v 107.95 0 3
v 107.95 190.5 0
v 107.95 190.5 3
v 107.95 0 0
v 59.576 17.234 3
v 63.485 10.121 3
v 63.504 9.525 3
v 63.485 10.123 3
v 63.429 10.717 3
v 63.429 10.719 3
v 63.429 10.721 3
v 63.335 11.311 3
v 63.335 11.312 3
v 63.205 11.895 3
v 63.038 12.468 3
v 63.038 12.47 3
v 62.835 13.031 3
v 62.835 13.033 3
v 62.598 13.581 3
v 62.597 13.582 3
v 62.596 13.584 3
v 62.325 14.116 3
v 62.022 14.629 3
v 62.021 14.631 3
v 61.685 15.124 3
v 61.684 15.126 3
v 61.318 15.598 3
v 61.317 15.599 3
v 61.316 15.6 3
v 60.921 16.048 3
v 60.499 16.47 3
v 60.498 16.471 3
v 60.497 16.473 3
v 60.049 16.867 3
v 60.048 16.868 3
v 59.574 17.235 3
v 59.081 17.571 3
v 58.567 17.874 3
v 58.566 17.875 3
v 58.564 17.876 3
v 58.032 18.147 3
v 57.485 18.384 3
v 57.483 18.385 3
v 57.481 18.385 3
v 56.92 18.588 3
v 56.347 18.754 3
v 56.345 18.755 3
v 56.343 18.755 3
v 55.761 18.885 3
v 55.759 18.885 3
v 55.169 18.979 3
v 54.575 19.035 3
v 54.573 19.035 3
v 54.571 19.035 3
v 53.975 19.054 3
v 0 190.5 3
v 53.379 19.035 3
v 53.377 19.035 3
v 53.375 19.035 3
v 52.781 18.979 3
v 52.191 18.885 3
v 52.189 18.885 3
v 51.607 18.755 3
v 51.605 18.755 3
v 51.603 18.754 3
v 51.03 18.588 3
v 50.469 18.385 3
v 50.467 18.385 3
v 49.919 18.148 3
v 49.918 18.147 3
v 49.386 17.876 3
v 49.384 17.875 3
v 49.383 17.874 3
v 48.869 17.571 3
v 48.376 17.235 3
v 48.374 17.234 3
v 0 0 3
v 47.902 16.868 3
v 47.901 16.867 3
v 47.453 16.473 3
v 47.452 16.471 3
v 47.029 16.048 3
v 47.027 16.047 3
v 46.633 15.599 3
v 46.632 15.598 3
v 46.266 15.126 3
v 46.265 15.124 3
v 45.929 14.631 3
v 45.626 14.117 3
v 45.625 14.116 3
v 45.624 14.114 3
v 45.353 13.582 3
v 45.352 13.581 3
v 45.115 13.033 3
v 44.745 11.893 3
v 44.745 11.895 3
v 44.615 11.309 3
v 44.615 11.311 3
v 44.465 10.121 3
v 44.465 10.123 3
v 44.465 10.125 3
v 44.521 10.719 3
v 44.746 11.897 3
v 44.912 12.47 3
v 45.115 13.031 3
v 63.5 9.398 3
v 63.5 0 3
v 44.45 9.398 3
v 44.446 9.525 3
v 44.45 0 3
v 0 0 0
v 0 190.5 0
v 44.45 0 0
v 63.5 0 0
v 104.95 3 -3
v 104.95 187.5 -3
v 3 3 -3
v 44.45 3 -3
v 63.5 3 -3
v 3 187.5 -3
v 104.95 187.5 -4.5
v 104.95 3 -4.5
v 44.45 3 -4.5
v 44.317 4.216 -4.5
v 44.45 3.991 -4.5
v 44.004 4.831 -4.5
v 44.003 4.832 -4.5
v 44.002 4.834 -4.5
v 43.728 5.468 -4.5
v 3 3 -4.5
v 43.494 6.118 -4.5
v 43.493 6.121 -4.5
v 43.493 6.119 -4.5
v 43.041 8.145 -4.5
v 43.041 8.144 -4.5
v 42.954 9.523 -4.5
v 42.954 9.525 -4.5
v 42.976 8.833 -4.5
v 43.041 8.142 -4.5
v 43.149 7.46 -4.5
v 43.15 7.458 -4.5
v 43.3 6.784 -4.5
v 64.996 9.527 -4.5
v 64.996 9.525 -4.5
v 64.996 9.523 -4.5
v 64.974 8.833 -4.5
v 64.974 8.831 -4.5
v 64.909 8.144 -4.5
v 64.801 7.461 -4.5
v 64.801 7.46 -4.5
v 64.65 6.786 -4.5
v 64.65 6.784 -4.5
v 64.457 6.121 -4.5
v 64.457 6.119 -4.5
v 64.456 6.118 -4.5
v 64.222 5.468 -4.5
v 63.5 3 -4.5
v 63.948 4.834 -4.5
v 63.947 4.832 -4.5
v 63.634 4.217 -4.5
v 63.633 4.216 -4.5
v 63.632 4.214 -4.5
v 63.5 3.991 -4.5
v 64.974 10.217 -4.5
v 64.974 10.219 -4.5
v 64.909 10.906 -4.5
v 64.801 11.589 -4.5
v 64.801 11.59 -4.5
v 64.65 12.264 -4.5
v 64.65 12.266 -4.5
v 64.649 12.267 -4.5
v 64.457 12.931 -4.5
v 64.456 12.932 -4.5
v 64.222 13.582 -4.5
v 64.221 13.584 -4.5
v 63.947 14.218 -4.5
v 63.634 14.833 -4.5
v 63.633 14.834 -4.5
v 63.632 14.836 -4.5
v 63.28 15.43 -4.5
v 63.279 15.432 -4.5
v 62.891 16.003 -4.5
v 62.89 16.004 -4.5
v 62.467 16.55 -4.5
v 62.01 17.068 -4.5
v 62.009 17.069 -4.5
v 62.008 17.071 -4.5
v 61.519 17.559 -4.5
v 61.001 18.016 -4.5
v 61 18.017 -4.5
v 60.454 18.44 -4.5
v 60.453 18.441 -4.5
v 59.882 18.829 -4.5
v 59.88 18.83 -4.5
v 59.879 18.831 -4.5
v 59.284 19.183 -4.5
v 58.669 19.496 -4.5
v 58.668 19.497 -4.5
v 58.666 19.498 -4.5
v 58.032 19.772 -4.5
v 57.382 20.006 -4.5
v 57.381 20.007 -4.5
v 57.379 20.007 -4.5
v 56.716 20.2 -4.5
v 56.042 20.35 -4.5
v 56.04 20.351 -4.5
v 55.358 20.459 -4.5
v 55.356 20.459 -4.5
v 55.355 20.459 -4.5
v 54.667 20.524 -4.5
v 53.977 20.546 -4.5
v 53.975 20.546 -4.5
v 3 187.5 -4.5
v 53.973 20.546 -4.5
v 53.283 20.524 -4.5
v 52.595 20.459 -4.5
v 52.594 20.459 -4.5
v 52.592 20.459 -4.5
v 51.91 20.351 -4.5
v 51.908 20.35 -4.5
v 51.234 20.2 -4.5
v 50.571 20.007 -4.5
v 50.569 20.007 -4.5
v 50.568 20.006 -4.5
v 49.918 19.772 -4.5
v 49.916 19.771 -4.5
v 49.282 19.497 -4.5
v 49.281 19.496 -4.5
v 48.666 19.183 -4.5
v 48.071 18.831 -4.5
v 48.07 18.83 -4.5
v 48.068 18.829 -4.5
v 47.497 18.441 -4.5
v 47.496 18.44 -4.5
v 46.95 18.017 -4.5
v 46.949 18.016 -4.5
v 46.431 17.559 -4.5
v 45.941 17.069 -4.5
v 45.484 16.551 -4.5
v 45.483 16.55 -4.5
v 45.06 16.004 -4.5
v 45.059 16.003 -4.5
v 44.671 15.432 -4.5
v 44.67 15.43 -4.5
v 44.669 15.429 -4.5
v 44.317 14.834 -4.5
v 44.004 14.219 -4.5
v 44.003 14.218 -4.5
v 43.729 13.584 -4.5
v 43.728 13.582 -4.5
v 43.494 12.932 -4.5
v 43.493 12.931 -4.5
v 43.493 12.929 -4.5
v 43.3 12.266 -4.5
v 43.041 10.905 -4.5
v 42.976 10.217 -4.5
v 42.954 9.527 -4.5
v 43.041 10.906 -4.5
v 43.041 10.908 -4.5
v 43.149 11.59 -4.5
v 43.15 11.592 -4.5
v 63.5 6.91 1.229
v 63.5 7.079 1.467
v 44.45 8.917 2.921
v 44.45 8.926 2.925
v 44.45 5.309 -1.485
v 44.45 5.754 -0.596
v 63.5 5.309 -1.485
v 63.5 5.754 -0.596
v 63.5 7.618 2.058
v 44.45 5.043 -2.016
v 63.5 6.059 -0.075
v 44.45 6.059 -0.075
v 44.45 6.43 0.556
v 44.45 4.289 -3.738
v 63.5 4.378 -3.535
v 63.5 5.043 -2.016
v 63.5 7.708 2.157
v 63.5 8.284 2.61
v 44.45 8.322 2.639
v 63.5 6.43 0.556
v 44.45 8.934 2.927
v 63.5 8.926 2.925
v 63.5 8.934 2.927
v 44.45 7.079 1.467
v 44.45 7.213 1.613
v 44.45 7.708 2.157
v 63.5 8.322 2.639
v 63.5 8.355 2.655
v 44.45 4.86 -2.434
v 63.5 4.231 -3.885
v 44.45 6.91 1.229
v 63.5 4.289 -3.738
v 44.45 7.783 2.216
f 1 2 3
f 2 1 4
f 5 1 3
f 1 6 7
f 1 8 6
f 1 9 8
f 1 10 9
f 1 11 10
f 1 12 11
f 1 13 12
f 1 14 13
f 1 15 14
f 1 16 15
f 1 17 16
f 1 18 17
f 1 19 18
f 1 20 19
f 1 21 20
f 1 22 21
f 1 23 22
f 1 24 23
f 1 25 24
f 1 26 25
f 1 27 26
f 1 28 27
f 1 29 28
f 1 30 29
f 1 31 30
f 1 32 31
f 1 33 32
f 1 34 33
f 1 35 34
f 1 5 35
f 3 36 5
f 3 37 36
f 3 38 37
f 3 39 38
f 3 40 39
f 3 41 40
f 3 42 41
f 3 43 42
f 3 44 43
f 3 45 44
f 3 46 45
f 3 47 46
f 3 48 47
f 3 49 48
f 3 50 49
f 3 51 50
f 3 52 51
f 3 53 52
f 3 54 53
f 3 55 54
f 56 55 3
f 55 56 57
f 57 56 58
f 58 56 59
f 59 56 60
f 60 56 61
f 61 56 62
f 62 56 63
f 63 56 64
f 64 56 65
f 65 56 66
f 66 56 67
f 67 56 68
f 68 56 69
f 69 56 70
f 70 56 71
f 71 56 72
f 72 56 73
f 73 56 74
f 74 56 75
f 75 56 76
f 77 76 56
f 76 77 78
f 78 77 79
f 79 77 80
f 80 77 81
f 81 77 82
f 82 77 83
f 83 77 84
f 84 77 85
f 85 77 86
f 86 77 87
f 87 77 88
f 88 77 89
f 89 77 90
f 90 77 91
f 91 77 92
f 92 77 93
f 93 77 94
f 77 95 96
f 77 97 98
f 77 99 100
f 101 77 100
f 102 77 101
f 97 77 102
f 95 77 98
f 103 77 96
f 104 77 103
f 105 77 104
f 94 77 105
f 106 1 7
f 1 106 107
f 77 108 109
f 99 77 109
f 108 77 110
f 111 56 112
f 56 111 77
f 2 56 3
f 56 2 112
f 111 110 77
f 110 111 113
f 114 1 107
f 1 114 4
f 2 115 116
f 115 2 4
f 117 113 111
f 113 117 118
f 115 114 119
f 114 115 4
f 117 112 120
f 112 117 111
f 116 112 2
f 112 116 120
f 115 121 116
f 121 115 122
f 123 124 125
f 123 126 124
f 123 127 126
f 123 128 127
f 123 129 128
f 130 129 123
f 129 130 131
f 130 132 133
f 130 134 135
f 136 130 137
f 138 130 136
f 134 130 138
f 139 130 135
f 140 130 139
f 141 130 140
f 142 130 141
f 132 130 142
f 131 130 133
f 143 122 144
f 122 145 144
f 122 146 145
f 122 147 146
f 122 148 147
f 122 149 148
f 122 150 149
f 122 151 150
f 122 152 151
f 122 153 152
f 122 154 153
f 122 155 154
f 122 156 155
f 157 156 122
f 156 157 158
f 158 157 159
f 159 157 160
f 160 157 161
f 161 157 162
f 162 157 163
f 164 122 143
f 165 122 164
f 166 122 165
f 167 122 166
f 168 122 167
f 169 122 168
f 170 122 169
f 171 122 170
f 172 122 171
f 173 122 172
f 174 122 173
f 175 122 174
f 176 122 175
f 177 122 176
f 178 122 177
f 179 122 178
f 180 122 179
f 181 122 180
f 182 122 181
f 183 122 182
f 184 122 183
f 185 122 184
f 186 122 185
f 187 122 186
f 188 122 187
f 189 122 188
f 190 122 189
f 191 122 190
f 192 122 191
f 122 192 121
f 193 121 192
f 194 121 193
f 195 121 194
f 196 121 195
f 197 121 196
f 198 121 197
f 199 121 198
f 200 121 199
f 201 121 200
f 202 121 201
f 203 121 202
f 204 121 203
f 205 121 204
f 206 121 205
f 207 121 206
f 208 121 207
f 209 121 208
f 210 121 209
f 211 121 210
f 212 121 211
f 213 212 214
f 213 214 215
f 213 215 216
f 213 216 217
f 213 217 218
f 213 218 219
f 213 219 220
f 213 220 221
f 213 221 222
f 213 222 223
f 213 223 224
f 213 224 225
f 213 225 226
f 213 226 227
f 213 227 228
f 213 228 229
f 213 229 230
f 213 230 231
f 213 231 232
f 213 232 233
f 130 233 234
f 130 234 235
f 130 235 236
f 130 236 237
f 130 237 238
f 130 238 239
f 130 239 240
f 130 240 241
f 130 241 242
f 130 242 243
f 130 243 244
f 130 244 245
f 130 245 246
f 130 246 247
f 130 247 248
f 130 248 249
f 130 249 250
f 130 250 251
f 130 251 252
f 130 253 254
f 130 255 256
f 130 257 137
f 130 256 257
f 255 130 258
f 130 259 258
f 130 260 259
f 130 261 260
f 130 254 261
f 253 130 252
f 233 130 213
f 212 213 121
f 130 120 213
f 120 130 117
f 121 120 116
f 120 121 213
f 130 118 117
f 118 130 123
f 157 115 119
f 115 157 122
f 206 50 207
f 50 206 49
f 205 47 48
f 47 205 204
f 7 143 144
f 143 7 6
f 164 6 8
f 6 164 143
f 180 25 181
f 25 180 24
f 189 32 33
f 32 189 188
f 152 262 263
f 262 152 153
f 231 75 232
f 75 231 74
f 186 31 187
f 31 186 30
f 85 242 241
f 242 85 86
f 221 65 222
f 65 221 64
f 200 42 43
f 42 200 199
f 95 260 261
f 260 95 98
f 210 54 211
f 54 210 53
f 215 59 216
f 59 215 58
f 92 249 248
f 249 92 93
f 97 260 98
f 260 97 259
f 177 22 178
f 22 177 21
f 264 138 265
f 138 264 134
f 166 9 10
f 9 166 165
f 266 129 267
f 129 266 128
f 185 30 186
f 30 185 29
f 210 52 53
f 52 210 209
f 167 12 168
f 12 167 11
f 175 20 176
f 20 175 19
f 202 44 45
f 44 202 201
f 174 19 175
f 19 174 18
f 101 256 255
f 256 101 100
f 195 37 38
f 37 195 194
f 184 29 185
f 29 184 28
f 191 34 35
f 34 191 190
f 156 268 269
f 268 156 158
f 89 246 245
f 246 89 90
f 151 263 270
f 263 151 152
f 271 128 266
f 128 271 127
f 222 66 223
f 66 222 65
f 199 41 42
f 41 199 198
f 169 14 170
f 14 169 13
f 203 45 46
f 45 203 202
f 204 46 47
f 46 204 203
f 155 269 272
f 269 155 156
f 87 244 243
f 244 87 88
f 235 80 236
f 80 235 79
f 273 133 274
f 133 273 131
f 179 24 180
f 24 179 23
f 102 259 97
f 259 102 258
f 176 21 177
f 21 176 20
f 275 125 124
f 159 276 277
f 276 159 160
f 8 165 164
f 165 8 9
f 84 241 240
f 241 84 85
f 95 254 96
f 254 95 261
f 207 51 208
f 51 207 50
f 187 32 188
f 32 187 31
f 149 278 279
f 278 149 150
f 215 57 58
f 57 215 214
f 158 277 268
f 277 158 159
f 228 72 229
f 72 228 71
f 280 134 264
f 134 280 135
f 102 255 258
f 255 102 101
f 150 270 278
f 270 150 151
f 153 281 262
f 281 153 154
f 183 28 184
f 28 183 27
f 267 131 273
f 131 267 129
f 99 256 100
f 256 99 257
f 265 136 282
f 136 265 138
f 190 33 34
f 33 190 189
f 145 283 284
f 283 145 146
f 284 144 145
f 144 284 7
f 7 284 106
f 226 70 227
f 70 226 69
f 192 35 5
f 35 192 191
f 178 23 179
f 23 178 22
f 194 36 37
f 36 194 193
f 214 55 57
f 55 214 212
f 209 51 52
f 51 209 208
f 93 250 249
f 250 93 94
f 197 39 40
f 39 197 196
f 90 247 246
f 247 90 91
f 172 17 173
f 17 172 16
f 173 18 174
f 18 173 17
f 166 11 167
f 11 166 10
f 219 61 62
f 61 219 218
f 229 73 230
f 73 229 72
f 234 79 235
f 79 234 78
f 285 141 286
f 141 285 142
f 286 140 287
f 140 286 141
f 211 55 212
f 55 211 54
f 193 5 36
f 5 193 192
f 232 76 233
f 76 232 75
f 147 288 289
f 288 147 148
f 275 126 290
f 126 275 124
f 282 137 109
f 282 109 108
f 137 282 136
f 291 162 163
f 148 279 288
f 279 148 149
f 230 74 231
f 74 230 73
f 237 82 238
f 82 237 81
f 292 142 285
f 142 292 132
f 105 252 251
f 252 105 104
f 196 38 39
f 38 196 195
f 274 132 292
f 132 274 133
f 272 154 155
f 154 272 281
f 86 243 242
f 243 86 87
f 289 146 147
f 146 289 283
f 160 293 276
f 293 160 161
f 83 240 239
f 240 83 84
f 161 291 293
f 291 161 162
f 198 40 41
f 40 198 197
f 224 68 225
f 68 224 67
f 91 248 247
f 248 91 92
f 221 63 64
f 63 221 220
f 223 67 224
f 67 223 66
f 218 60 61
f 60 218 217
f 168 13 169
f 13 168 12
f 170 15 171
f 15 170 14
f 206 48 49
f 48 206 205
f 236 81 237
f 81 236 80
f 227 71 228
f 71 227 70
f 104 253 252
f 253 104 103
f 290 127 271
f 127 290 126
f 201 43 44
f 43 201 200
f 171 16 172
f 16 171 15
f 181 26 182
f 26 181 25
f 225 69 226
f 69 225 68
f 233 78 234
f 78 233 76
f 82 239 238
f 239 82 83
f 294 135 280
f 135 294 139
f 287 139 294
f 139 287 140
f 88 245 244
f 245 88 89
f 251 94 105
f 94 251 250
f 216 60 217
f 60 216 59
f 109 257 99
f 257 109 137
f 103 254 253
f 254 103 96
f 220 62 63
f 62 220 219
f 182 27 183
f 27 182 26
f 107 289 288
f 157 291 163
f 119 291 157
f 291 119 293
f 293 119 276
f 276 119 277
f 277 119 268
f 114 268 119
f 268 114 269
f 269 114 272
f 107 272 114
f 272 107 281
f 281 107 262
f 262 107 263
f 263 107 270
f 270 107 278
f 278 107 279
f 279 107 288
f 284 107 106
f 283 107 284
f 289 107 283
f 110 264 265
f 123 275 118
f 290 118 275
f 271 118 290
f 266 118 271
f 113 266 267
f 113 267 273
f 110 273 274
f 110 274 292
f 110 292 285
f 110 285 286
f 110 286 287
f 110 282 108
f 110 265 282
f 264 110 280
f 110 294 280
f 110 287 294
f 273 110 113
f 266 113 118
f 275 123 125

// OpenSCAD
// 3" = 3.014"

//cardBox(3.25, 5.7, 1.500);  // Regular deck box
//cardBox(3.25, 5.7, 0.750);  // Shallow deck box
//cardBox(3.25, 5.7, 2.375);  // Tall deck box  3.125 
//cardBox(4.25, 7.5, 2.250);  // Wide deck box

//lid(3.25, 5.7); // Shallow, regular, and tall deck box lid
lid(4.25, 7.5); // Wide deck box lid


inchesToMM = 25.4;

function cubePoints(w, d, t) = [
    [t,t,0],     // 0 Bottom A 
    [w-t,t,0],   // 1 Bottom B
    [w-t,d-t,0], // 2 Bottom C
    [t,d-t,0],   // 3 Bottom D
    [0,0,t],     // 4 Top A
    [w,0,t],     // 5 Top B
    [w,d,t],     // 6 Top C
    [0,d,t]];    // 7 Top D

function cubeFaces() = [
    [0,1,2,3],   // Bottom
    [4,5,1,0],   // Front
    [7,6,5,4],   // Top
    [5,6,2,1],   // Right
    [6,7,3,2],   // Back
    [7,4,0,3]];  // Left

module lid(width, depth, thickness = 3) {

    w  = (width * inchesToMM);
    d  = (depth * inchesToMM);
    t  = thickness;
    fd = ( 0.375 * inchesToMM);

    difference() {
        union() {
            cube([w, d, t]);
            translate([0, 0, -t]) polyhedron(cubePoints(w, d, t), cubeFaces());
            translate([t, t, -t*(3/2)]) cube([w - 2 * t, d - 2*t, t/2]);
        } 
        translate([w/2,fd,-t*(3/2)-0.02]) cylinder((5/2) * t + 0.04, fd + t/2, fd, $fn=100);
        translate([w/2,0,-(t/3)-0.02]) cube([2*fd,2*fd,(5/2) * t + 1],center=true);          
    }
}

module cardBox(width, depth, height, thickness = 3) {

    w = ( width * inchesToMM);
    d = ( depth * inchesToMM);
    h = (height * inchesToMM);
    t = thickness;

    difference () {
        cube([w, d, h]);
        translate([t,t,-.01]) cube([w - 2 * t, d - 2 * t, h+0.02]);
        translate([0,0,h-t+.01]) polyhedron(cubePoints(w, d, t), cubeFaces());
    }
    translate([0,0,-t]) polyhedron(cubePoints(w, d, t), cubeFaces());
    translate([t,t,-t*(3/2)]) cube([w - 2 * t, d - 2*t, t/2]) ;
}
